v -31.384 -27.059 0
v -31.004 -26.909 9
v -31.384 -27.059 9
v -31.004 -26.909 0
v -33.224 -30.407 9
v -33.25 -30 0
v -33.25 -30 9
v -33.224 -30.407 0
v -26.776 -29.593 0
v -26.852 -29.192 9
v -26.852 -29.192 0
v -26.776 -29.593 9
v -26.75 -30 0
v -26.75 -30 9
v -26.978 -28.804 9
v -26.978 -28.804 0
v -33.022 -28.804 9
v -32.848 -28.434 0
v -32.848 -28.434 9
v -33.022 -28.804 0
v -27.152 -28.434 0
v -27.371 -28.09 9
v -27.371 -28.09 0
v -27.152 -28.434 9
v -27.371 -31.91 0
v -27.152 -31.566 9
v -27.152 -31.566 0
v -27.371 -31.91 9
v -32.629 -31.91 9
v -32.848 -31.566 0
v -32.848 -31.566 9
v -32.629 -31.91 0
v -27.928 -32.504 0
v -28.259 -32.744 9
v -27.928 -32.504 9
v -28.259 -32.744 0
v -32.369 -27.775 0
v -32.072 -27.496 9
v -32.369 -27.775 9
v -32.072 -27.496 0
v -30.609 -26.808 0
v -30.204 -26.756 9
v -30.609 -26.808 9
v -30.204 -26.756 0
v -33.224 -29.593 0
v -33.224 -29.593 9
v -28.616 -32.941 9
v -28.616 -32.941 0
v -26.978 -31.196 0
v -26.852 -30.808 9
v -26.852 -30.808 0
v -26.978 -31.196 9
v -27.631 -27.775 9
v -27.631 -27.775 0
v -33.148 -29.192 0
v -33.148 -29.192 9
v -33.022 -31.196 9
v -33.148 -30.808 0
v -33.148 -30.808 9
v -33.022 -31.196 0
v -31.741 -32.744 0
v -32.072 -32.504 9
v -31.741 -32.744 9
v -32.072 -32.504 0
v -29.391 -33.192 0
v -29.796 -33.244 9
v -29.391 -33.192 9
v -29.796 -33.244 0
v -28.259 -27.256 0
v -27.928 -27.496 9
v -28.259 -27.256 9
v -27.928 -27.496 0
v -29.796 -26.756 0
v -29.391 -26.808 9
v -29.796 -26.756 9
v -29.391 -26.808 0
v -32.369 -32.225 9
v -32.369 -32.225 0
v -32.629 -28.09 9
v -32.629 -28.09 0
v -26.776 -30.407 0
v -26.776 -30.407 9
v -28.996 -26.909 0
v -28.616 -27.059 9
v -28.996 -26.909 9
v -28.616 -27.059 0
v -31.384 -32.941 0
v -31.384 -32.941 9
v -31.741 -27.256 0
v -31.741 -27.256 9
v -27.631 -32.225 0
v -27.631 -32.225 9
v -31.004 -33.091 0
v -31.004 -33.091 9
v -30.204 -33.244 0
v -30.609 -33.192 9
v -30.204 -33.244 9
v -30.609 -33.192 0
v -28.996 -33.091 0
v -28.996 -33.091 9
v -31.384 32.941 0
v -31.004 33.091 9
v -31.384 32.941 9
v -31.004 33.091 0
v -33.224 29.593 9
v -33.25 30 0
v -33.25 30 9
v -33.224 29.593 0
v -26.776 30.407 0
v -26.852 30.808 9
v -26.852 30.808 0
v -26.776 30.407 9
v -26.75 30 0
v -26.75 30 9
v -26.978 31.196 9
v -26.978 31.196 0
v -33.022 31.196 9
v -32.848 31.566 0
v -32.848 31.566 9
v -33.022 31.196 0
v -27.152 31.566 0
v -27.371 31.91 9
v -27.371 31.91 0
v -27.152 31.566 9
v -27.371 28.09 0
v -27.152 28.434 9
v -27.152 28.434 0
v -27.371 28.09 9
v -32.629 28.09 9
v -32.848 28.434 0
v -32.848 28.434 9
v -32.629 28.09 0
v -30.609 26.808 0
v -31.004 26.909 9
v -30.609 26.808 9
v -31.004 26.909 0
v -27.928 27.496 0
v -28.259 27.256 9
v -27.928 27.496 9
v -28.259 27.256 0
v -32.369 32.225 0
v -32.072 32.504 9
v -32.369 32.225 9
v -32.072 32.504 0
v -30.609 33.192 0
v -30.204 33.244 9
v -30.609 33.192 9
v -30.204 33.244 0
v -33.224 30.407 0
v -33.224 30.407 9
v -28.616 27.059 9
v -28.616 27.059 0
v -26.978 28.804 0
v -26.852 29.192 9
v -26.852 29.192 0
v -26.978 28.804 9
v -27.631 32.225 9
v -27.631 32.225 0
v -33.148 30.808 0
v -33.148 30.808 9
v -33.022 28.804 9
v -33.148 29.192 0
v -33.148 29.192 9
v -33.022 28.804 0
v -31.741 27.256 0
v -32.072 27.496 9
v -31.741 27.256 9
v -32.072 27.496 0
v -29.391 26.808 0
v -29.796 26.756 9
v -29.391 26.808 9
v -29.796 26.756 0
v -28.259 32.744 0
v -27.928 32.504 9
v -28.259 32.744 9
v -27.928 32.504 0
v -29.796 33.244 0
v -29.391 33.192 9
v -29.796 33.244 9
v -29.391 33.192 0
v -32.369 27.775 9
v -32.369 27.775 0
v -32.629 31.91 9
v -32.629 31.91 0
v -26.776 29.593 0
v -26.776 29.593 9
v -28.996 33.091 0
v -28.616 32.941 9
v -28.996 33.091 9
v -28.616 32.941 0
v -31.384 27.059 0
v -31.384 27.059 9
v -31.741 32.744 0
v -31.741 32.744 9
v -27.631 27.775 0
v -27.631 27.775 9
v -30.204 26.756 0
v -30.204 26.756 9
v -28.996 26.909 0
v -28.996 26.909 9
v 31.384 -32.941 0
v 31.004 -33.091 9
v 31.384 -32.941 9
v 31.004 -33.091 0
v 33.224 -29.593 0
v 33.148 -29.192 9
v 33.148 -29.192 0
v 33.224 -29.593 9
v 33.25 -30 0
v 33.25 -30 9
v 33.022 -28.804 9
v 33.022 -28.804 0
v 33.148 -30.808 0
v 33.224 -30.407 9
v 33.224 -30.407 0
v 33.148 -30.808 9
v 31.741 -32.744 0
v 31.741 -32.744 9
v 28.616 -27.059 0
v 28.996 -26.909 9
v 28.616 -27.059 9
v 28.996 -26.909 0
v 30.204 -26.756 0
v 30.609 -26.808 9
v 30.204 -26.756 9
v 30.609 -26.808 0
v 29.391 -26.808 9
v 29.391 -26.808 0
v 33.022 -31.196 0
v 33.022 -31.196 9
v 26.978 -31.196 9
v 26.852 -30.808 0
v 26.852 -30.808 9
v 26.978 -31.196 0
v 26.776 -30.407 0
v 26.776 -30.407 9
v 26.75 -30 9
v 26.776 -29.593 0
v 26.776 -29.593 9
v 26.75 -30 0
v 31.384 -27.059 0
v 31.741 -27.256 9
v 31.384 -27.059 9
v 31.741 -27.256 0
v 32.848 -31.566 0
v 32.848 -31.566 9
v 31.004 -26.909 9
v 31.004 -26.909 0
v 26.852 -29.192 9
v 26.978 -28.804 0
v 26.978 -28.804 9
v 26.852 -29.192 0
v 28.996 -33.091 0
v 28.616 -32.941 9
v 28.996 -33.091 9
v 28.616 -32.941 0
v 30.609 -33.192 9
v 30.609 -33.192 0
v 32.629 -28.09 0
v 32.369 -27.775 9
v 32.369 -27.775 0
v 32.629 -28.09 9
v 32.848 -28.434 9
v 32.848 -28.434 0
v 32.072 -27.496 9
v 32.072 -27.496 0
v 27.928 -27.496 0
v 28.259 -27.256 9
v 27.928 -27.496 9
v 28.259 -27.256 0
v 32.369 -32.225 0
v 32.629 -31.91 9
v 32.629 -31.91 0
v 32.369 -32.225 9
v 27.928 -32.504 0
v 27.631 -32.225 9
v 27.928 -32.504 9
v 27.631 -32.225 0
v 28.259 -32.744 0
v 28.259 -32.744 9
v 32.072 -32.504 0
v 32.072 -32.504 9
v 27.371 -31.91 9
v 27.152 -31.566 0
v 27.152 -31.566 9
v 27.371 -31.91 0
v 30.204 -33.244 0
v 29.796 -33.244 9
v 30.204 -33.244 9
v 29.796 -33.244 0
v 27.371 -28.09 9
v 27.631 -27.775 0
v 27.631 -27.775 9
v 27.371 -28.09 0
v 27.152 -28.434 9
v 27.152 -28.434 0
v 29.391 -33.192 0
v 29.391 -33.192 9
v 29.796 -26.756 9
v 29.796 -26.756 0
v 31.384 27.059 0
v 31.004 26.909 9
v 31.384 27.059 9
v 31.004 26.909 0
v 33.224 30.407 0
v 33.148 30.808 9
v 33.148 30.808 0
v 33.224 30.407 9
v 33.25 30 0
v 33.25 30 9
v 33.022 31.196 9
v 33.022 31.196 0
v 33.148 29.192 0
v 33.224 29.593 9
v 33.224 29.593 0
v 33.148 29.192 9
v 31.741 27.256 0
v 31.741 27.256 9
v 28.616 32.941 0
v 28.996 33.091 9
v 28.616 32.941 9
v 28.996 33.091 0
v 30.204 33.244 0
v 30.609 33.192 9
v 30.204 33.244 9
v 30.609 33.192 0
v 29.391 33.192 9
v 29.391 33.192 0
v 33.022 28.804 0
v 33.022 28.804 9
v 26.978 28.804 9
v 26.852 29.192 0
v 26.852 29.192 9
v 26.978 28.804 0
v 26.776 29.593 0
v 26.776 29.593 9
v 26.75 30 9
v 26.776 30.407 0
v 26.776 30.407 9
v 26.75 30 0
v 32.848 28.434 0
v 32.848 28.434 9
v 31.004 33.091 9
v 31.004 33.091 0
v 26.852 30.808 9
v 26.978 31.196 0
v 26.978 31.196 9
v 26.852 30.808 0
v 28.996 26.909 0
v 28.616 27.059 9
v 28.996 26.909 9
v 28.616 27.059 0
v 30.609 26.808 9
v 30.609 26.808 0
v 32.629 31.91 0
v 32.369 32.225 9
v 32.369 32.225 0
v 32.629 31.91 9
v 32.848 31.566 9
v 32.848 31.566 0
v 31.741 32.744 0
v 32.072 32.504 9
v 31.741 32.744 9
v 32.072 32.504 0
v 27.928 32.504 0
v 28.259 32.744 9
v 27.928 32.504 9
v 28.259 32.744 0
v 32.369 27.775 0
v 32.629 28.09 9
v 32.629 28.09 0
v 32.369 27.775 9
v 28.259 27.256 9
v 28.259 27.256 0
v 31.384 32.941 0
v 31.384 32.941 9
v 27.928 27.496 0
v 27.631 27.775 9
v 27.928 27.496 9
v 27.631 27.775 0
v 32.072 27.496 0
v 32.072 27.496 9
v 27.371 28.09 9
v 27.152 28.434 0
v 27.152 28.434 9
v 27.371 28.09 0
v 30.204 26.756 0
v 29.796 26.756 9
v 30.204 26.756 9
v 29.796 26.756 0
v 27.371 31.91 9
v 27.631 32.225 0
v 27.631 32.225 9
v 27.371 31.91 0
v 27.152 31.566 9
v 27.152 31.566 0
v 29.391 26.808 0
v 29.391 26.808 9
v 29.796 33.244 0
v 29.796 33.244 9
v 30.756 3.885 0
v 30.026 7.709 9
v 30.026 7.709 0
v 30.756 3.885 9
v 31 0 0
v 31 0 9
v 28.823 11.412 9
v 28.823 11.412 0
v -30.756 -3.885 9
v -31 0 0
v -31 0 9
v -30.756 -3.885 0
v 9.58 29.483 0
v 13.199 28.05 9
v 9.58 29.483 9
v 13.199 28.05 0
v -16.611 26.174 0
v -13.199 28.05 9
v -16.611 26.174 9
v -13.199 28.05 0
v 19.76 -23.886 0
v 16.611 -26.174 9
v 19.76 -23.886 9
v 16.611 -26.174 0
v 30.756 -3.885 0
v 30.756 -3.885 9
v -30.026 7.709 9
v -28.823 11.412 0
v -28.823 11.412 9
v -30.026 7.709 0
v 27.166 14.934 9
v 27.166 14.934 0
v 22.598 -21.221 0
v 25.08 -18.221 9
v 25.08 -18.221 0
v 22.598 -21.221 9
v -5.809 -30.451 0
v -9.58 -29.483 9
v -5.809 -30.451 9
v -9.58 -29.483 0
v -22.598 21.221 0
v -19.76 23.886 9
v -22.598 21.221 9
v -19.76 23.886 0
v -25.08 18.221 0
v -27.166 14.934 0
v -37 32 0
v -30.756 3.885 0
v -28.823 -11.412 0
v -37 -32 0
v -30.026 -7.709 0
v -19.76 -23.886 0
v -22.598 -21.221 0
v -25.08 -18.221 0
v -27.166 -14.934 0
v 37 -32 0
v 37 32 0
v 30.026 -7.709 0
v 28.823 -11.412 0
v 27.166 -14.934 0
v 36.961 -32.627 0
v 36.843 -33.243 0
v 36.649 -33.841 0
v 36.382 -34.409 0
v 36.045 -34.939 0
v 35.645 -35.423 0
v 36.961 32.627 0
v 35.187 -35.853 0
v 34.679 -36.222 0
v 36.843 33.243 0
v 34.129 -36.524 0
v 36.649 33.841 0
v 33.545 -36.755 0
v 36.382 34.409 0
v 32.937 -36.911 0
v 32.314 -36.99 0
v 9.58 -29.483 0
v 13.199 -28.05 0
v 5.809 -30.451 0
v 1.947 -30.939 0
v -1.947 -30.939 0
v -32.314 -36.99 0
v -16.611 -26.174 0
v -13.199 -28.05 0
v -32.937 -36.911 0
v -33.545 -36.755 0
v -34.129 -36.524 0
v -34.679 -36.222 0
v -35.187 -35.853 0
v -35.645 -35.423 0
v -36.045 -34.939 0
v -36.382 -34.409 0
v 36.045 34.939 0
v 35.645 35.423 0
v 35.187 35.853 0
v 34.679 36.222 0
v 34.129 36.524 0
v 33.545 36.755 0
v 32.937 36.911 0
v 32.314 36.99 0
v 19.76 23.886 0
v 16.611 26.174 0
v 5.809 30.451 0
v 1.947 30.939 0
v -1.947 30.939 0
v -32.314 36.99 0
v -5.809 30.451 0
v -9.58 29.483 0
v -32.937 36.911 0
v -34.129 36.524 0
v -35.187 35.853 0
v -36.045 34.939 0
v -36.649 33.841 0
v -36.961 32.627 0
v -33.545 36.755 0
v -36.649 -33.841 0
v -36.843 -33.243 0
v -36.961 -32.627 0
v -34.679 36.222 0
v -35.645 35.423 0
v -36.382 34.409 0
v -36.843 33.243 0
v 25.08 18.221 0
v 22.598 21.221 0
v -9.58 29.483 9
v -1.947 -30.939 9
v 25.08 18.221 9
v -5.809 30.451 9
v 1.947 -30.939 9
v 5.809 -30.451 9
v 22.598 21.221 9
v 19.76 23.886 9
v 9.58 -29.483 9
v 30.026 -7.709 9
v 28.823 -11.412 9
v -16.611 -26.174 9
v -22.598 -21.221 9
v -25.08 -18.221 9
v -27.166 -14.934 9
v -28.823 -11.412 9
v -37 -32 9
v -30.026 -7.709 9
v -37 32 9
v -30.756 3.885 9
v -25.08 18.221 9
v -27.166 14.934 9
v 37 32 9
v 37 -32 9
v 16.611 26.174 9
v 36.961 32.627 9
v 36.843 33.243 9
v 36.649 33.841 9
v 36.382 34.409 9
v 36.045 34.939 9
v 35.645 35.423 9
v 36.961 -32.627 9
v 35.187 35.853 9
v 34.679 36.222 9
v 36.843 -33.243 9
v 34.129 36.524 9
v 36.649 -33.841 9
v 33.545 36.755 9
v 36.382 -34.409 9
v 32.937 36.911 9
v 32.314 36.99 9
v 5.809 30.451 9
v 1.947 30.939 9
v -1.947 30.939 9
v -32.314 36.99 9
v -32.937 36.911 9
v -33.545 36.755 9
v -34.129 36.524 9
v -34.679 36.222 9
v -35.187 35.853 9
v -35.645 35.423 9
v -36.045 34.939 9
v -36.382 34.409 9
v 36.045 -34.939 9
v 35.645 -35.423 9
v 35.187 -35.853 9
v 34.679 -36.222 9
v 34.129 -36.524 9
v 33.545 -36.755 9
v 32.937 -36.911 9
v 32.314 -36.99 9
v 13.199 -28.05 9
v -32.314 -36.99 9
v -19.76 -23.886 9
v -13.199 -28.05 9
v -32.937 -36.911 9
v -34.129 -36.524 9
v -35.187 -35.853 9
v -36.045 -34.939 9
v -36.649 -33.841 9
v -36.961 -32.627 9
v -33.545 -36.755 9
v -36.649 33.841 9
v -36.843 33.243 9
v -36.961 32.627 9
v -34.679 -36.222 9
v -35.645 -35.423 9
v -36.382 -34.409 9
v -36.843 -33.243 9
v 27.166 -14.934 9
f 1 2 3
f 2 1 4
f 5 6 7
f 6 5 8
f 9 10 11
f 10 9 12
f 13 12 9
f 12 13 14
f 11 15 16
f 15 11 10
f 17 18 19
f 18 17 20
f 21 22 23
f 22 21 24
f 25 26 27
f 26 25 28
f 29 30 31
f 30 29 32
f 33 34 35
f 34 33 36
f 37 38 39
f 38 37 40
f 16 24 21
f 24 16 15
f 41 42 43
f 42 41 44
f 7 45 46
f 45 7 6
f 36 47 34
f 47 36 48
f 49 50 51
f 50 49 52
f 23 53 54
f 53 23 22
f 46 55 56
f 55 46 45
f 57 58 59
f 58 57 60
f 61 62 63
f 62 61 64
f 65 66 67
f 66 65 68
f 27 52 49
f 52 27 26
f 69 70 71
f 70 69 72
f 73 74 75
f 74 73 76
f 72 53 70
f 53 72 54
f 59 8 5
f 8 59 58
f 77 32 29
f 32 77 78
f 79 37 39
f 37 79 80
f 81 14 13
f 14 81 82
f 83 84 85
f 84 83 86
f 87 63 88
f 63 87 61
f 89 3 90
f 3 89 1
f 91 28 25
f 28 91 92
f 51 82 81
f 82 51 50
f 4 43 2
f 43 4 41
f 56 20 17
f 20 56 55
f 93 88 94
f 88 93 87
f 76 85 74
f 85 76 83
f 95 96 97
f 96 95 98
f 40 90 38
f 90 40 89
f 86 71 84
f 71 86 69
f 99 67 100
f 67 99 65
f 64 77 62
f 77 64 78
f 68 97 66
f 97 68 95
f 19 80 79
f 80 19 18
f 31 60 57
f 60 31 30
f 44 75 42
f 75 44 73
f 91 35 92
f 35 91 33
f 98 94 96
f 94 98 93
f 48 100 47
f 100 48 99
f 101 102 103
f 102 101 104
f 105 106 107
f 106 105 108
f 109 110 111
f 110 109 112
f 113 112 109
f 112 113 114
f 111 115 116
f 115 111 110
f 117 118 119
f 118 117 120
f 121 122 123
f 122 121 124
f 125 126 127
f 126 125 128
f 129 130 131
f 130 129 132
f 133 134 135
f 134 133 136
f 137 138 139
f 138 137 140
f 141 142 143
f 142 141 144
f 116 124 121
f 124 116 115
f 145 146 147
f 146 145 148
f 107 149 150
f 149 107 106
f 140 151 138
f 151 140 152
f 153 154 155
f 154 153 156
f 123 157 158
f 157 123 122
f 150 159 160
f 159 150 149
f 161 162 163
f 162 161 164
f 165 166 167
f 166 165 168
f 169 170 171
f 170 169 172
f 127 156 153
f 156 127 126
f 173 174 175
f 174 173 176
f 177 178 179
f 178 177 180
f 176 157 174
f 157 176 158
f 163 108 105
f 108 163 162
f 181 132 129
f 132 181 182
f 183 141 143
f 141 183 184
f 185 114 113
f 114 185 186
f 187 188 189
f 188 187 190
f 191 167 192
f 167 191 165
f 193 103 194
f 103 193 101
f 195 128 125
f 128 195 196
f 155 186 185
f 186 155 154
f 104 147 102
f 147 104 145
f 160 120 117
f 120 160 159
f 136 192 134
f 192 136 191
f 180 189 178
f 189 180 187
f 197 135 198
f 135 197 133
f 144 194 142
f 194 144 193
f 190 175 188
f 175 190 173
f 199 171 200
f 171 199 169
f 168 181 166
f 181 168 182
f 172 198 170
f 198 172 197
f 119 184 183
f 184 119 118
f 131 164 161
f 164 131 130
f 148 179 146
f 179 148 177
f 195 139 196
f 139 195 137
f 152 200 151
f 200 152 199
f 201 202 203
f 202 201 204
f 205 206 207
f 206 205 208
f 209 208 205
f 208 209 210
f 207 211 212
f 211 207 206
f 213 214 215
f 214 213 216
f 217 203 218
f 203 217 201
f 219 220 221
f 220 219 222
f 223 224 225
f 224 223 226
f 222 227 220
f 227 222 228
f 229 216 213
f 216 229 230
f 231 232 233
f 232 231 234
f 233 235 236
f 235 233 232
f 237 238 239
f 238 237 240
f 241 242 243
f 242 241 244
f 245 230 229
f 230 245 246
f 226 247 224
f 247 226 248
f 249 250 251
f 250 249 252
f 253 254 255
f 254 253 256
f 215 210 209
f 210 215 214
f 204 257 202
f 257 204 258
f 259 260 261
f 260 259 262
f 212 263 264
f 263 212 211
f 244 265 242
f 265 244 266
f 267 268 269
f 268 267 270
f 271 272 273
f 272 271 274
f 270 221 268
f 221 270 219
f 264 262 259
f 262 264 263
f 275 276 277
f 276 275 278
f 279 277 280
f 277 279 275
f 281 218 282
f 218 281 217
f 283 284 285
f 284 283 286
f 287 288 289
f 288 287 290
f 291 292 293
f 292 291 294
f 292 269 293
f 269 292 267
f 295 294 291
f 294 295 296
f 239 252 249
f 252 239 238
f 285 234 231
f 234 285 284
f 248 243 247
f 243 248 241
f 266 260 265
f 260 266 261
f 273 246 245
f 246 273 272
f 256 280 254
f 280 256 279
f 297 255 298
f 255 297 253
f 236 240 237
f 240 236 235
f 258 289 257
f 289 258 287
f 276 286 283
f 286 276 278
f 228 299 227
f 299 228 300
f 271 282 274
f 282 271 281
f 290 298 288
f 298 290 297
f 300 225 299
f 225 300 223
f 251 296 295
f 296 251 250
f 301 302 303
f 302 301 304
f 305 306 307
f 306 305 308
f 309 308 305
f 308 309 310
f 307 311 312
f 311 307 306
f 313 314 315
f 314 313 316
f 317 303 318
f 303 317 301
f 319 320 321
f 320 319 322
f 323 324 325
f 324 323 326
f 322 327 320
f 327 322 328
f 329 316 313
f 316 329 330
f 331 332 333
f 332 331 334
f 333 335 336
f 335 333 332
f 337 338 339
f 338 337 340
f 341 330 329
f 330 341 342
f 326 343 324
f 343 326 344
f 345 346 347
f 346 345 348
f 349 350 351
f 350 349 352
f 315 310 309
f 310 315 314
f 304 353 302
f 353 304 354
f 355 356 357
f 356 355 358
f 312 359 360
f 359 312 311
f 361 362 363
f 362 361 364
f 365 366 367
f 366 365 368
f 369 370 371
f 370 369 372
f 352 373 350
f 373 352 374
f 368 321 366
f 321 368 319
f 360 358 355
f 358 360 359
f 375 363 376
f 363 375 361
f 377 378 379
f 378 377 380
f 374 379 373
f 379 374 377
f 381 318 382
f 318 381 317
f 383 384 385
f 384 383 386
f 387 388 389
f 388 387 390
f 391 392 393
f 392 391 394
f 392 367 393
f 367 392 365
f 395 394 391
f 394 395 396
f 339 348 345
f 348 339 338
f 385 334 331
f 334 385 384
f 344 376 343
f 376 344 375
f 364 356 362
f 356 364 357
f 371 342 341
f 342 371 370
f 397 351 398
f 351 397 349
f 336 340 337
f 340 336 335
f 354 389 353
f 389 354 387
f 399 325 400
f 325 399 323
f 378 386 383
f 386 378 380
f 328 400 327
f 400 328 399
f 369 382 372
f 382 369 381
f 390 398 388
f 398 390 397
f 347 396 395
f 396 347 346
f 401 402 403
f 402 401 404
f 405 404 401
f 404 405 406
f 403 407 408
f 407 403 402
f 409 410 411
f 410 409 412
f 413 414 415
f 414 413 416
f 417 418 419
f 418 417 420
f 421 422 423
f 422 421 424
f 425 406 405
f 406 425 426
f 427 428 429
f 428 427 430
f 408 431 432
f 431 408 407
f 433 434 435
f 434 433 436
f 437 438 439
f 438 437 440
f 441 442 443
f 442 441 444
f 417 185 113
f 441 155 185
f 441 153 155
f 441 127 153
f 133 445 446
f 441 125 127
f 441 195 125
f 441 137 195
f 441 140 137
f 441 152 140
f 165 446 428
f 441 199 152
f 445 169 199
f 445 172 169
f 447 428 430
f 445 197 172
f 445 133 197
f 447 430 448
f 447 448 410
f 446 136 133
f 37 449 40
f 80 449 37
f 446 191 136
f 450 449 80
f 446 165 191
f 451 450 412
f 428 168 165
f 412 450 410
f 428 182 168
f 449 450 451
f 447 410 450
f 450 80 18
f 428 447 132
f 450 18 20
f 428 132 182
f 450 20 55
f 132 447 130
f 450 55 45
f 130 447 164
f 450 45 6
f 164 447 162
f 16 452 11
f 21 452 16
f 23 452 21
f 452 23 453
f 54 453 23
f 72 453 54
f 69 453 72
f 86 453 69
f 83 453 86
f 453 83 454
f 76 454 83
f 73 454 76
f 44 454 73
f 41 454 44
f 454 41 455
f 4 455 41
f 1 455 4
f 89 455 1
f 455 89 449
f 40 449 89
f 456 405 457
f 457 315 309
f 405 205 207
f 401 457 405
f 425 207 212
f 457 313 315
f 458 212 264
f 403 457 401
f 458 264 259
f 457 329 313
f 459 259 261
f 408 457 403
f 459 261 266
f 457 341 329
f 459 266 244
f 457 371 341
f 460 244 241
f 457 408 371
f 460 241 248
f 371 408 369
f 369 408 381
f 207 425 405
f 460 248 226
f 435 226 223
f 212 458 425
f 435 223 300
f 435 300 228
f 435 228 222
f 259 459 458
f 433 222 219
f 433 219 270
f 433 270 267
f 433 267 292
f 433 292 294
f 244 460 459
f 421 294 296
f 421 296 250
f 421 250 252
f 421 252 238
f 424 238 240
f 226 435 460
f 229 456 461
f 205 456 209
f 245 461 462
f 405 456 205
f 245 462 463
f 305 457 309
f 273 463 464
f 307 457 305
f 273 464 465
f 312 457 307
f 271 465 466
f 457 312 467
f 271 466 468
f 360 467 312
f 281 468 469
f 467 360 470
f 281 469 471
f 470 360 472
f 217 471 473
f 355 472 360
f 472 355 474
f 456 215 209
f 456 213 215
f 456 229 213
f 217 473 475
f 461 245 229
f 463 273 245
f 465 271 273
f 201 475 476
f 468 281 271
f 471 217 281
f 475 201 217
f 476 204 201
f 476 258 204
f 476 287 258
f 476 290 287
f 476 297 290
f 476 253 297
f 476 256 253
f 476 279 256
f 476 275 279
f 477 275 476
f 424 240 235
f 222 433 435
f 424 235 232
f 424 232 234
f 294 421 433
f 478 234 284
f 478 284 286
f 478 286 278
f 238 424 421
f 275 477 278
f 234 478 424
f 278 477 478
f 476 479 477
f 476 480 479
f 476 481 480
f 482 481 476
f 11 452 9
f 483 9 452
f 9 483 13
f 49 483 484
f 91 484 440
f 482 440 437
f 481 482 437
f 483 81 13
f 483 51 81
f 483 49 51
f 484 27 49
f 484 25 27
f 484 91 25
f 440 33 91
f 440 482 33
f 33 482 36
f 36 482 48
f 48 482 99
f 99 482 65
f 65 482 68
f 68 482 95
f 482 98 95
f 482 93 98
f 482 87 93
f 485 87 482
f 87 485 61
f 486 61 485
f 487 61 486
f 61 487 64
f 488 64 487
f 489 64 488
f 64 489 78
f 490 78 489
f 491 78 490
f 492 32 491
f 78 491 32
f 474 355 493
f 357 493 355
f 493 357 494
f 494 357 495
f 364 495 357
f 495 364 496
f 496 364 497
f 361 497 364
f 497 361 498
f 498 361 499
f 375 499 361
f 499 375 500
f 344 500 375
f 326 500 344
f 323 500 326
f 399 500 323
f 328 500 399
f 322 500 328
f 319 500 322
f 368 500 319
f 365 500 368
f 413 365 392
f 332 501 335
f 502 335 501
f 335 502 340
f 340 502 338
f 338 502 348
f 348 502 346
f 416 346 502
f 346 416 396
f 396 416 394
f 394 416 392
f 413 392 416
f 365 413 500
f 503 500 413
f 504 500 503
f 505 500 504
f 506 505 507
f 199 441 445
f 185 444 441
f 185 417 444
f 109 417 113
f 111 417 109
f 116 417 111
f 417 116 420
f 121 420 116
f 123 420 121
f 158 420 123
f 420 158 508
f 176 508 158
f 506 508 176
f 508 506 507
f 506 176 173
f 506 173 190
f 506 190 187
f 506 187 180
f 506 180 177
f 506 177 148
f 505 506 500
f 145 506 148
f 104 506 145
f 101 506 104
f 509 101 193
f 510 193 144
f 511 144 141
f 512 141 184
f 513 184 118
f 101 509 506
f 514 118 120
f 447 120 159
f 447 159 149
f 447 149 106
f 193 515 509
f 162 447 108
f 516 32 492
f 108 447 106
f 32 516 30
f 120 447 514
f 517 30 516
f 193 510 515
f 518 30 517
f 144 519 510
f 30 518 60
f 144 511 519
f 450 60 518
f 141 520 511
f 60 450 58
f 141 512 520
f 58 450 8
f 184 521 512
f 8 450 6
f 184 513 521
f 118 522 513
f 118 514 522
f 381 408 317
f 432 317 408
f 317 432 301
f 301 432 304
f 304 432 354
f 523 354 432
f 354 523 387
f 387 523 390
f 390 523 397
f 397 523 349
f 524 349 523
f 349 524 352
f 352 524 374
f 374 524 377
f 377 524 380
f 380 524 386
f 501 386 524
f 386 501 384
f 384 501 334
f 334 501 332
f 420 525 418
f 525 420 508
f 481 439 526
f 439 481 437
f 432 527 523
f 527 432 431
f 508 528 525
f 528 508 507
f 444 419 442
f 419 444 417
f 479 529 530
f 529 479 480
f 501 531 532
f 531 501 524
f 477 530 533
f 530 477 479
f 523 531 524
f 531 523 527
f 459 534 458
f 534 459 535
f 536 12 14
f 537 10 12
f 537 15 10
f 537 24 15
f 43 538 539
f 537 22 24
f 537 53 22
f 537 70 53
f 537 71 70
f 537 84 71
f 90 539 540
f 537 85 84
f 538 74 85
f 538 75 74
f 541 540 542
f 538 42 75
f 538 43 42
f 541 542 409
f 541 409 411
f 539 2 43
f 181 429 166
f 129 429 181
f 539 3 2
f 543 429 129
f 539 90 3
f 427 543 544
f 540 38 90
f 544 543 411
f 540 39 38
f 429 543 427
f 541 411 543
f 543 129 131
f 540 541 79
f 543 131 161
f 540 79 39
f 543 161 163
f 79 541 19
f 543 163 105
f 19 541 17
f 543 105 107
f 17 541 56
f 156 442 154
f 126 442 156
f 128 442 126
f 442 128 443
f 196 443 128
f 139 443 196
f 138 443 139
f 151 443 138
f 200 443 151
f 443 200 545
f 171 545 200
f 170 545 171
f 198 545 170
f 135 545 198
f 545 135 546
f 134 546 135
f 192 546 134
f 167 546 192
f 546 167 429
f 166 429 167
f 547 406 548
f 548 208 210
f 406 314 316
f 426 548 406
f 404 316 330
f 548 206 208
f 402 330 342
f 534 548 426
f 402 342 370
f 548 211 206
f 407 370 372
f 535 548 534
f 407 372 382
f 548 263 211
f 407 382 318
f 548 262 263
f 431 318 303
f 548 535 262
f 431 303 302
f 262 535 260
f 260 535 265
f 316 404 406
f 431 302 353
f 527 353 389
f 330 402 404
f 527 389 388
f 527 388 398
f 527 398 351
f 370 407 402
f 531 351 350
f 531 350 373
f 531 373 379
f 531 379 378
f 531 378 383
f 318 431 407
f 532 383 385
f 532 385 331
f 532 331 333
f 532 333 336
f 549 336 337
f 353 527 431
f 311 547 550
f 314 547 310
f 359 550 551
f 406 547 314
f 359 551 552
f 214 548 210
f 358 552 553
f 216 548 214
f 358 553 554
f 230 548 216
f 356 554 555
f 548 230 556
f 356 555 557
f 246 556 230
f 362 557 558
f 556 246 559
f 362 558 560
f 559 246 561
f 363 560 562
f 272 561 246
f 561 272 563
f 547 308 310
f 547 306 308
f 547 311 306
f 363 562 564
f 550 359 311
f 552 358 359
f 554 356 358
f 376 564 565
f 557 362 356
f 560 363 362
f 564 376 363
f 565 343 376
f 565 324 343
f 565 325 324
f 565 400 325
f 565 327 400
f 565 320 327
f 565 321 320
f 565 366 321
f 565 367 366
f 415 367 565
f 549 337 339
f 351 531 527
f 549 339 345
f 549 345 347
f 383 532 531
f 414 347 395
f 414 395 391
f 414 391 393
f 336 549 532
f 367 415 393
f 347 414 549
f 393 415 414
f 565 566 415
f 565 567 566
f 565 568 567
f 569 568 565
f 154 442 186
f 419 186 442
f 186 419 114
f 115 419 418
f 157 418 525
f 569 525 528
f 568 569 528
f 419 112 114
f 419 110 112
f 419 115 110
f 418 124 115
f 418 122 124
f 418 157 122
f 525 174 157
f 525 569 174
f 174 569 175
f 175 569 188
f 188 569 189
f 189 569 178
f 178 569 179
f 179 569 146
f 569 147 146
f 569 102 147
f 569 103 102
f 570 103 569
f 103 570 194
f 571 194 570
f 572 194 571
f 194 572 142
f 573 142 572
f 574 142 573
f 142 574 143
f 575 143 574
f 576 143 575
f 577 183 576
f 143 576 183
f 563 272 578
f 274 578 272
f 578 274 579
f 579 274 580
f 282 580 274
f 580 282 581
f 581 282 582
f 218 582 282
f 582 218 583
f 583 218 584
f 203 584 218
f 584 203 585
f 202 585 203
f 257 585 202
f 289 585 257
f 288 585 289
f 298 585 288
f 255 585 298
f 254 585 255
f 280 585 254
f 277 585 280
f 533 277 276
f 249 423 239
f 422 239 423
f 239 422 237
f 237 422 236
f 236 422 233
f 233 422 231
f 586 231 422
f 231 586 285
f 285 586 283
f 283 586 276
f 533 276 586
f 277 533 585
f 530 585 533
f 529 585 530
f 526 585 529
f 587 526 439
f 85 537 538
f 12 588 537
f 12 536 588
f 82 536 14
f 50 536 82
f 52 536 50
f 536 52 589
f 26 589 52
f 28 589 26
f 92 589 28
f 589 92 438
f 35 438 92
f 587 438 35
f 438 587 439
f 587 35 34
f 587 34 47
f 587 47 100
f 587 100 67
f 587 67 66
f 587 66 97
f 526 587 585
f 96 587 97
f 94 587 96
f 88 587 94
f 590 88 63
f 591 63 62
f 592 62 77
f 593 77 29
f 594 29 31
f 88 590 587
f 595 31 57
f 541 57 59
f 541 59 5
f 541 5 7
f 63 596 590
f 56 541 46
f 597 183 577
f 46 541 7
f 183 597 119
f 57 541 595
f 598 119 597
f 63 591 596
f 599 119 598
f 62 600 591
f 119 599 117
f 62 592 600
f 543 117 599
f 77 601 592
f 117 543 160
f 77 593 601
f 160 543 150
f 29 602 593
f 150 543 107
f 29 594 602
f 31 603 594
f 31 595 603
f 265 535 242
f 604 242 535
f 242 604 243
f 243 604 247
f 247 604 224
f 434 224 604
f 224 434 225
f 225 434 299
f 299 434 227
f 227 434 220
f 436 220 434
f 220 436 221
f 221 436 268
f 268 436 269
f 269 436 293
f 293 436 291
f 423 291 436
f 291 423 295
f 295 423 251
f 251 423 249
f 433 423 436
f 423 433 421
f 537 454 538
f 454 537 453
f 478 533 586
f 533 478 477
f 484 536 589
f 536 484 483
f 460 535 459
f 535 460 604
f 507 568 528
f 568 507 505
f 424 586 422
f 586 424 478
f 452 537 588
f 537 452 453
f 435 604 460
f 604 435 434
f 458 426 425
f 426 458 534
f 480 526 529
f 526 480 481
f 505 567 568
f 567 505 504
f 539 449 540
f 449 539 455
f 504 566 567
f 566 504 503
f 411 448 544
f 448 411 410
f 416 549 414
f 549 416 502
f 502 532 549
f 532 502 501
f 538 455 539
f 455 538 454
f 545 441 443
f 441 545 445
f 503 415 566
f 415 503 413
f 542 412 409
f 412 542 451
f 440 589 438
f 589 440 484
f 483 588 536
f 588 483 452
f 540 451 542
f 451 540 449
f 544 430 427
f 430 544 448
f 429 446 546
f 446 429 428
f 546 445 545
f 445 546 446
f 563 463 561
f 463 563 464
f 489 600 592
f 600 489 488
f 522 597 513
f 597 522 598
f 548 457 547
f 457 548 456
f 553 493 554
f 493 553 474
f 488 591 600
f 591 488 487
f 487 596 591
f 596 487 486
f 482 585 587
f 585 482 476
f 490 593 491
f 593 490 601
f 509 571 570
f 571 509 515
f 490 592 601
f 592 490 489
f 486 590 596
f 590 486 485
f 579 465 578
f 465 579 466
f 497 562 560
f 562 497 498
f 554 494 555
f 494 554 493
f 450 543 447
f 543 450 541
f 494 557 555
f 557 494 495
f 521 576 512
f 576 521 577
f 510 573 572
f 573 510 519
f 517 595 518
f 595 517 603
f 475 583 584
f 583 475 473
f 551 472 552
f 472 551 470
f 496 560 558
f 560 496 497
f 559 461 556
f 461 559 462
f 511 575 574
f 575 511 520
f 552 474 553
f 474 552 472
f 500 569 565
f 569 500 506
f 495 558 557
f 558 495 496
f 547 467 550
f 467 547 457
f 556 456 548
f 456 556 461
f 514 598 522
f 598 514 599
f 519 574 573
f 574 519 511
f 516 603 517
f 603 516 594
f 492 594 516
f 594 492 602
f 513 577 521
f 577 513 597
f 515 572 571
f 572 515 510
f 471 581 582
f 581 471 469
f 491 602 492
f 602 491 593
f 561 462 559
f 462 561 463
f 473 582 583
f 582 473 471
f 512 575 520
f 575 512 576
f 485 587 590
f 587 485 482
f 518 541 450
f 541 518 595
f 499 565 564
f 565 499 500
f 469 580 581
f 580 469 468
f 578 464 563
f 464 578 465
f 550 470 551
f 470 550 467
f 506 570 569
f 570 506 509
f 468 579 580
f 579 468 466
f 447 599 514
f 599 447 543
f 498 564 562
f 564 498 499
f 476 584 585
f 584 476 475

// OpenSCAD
$fn = 50;

difference() {
	union() {
		hull() {
			translate(v = [-32.0, 32.0, 0]) {
				cylinder(h = 9, r = 5);
			}
			translate(v = [32.0, 32.0, 0]) {
				cylinder(h = 9, r = 5);
			}
			translate(v = [-32.0, -32.0, 0]) {
				cylinder(h = 9, r = 5);
			}
			translate(v = [32.0, -32.0, 0]) {
				cylinder(h = 9, r = 5);
			}
		}
	}
	union() {
		translate(v = [-30.0, -30.0, -100.0]) {
			cylinder(h = 200, r = 3.25);
		}
		translate(v = [-30.0, 30.0, -100.0]) {
			cylinder(h = 200, r = 3.25);
		}
		translate(v = [30.0, -30.0, -100.0]) {
			cylinder(h = 200, r = 3.25);
		}
		translate(v = [30.0, 30.0, -100.0]) {
			cylinder(h = 200, r = 3.25);
		}
		translate(v = [-30.0, -30.0, -100.0]) {
			cylinder(h = 200, r = 1.8);
		}
		translate(v = [-30.0, 30.0, -100.0]) {
			cylinder(h = 200, r = 1.8);
		}
		translate(v = [30.0, -30.0, -100.0]) {
			cylinder(h = 200, r = 1.8);
		}
		translate(v = [30.0, 30.0, -100.0]) {
			cylinder(h = 200, r = 1.8);
		}
		cylinder(h = 9, r = 31.0);
	}
}
